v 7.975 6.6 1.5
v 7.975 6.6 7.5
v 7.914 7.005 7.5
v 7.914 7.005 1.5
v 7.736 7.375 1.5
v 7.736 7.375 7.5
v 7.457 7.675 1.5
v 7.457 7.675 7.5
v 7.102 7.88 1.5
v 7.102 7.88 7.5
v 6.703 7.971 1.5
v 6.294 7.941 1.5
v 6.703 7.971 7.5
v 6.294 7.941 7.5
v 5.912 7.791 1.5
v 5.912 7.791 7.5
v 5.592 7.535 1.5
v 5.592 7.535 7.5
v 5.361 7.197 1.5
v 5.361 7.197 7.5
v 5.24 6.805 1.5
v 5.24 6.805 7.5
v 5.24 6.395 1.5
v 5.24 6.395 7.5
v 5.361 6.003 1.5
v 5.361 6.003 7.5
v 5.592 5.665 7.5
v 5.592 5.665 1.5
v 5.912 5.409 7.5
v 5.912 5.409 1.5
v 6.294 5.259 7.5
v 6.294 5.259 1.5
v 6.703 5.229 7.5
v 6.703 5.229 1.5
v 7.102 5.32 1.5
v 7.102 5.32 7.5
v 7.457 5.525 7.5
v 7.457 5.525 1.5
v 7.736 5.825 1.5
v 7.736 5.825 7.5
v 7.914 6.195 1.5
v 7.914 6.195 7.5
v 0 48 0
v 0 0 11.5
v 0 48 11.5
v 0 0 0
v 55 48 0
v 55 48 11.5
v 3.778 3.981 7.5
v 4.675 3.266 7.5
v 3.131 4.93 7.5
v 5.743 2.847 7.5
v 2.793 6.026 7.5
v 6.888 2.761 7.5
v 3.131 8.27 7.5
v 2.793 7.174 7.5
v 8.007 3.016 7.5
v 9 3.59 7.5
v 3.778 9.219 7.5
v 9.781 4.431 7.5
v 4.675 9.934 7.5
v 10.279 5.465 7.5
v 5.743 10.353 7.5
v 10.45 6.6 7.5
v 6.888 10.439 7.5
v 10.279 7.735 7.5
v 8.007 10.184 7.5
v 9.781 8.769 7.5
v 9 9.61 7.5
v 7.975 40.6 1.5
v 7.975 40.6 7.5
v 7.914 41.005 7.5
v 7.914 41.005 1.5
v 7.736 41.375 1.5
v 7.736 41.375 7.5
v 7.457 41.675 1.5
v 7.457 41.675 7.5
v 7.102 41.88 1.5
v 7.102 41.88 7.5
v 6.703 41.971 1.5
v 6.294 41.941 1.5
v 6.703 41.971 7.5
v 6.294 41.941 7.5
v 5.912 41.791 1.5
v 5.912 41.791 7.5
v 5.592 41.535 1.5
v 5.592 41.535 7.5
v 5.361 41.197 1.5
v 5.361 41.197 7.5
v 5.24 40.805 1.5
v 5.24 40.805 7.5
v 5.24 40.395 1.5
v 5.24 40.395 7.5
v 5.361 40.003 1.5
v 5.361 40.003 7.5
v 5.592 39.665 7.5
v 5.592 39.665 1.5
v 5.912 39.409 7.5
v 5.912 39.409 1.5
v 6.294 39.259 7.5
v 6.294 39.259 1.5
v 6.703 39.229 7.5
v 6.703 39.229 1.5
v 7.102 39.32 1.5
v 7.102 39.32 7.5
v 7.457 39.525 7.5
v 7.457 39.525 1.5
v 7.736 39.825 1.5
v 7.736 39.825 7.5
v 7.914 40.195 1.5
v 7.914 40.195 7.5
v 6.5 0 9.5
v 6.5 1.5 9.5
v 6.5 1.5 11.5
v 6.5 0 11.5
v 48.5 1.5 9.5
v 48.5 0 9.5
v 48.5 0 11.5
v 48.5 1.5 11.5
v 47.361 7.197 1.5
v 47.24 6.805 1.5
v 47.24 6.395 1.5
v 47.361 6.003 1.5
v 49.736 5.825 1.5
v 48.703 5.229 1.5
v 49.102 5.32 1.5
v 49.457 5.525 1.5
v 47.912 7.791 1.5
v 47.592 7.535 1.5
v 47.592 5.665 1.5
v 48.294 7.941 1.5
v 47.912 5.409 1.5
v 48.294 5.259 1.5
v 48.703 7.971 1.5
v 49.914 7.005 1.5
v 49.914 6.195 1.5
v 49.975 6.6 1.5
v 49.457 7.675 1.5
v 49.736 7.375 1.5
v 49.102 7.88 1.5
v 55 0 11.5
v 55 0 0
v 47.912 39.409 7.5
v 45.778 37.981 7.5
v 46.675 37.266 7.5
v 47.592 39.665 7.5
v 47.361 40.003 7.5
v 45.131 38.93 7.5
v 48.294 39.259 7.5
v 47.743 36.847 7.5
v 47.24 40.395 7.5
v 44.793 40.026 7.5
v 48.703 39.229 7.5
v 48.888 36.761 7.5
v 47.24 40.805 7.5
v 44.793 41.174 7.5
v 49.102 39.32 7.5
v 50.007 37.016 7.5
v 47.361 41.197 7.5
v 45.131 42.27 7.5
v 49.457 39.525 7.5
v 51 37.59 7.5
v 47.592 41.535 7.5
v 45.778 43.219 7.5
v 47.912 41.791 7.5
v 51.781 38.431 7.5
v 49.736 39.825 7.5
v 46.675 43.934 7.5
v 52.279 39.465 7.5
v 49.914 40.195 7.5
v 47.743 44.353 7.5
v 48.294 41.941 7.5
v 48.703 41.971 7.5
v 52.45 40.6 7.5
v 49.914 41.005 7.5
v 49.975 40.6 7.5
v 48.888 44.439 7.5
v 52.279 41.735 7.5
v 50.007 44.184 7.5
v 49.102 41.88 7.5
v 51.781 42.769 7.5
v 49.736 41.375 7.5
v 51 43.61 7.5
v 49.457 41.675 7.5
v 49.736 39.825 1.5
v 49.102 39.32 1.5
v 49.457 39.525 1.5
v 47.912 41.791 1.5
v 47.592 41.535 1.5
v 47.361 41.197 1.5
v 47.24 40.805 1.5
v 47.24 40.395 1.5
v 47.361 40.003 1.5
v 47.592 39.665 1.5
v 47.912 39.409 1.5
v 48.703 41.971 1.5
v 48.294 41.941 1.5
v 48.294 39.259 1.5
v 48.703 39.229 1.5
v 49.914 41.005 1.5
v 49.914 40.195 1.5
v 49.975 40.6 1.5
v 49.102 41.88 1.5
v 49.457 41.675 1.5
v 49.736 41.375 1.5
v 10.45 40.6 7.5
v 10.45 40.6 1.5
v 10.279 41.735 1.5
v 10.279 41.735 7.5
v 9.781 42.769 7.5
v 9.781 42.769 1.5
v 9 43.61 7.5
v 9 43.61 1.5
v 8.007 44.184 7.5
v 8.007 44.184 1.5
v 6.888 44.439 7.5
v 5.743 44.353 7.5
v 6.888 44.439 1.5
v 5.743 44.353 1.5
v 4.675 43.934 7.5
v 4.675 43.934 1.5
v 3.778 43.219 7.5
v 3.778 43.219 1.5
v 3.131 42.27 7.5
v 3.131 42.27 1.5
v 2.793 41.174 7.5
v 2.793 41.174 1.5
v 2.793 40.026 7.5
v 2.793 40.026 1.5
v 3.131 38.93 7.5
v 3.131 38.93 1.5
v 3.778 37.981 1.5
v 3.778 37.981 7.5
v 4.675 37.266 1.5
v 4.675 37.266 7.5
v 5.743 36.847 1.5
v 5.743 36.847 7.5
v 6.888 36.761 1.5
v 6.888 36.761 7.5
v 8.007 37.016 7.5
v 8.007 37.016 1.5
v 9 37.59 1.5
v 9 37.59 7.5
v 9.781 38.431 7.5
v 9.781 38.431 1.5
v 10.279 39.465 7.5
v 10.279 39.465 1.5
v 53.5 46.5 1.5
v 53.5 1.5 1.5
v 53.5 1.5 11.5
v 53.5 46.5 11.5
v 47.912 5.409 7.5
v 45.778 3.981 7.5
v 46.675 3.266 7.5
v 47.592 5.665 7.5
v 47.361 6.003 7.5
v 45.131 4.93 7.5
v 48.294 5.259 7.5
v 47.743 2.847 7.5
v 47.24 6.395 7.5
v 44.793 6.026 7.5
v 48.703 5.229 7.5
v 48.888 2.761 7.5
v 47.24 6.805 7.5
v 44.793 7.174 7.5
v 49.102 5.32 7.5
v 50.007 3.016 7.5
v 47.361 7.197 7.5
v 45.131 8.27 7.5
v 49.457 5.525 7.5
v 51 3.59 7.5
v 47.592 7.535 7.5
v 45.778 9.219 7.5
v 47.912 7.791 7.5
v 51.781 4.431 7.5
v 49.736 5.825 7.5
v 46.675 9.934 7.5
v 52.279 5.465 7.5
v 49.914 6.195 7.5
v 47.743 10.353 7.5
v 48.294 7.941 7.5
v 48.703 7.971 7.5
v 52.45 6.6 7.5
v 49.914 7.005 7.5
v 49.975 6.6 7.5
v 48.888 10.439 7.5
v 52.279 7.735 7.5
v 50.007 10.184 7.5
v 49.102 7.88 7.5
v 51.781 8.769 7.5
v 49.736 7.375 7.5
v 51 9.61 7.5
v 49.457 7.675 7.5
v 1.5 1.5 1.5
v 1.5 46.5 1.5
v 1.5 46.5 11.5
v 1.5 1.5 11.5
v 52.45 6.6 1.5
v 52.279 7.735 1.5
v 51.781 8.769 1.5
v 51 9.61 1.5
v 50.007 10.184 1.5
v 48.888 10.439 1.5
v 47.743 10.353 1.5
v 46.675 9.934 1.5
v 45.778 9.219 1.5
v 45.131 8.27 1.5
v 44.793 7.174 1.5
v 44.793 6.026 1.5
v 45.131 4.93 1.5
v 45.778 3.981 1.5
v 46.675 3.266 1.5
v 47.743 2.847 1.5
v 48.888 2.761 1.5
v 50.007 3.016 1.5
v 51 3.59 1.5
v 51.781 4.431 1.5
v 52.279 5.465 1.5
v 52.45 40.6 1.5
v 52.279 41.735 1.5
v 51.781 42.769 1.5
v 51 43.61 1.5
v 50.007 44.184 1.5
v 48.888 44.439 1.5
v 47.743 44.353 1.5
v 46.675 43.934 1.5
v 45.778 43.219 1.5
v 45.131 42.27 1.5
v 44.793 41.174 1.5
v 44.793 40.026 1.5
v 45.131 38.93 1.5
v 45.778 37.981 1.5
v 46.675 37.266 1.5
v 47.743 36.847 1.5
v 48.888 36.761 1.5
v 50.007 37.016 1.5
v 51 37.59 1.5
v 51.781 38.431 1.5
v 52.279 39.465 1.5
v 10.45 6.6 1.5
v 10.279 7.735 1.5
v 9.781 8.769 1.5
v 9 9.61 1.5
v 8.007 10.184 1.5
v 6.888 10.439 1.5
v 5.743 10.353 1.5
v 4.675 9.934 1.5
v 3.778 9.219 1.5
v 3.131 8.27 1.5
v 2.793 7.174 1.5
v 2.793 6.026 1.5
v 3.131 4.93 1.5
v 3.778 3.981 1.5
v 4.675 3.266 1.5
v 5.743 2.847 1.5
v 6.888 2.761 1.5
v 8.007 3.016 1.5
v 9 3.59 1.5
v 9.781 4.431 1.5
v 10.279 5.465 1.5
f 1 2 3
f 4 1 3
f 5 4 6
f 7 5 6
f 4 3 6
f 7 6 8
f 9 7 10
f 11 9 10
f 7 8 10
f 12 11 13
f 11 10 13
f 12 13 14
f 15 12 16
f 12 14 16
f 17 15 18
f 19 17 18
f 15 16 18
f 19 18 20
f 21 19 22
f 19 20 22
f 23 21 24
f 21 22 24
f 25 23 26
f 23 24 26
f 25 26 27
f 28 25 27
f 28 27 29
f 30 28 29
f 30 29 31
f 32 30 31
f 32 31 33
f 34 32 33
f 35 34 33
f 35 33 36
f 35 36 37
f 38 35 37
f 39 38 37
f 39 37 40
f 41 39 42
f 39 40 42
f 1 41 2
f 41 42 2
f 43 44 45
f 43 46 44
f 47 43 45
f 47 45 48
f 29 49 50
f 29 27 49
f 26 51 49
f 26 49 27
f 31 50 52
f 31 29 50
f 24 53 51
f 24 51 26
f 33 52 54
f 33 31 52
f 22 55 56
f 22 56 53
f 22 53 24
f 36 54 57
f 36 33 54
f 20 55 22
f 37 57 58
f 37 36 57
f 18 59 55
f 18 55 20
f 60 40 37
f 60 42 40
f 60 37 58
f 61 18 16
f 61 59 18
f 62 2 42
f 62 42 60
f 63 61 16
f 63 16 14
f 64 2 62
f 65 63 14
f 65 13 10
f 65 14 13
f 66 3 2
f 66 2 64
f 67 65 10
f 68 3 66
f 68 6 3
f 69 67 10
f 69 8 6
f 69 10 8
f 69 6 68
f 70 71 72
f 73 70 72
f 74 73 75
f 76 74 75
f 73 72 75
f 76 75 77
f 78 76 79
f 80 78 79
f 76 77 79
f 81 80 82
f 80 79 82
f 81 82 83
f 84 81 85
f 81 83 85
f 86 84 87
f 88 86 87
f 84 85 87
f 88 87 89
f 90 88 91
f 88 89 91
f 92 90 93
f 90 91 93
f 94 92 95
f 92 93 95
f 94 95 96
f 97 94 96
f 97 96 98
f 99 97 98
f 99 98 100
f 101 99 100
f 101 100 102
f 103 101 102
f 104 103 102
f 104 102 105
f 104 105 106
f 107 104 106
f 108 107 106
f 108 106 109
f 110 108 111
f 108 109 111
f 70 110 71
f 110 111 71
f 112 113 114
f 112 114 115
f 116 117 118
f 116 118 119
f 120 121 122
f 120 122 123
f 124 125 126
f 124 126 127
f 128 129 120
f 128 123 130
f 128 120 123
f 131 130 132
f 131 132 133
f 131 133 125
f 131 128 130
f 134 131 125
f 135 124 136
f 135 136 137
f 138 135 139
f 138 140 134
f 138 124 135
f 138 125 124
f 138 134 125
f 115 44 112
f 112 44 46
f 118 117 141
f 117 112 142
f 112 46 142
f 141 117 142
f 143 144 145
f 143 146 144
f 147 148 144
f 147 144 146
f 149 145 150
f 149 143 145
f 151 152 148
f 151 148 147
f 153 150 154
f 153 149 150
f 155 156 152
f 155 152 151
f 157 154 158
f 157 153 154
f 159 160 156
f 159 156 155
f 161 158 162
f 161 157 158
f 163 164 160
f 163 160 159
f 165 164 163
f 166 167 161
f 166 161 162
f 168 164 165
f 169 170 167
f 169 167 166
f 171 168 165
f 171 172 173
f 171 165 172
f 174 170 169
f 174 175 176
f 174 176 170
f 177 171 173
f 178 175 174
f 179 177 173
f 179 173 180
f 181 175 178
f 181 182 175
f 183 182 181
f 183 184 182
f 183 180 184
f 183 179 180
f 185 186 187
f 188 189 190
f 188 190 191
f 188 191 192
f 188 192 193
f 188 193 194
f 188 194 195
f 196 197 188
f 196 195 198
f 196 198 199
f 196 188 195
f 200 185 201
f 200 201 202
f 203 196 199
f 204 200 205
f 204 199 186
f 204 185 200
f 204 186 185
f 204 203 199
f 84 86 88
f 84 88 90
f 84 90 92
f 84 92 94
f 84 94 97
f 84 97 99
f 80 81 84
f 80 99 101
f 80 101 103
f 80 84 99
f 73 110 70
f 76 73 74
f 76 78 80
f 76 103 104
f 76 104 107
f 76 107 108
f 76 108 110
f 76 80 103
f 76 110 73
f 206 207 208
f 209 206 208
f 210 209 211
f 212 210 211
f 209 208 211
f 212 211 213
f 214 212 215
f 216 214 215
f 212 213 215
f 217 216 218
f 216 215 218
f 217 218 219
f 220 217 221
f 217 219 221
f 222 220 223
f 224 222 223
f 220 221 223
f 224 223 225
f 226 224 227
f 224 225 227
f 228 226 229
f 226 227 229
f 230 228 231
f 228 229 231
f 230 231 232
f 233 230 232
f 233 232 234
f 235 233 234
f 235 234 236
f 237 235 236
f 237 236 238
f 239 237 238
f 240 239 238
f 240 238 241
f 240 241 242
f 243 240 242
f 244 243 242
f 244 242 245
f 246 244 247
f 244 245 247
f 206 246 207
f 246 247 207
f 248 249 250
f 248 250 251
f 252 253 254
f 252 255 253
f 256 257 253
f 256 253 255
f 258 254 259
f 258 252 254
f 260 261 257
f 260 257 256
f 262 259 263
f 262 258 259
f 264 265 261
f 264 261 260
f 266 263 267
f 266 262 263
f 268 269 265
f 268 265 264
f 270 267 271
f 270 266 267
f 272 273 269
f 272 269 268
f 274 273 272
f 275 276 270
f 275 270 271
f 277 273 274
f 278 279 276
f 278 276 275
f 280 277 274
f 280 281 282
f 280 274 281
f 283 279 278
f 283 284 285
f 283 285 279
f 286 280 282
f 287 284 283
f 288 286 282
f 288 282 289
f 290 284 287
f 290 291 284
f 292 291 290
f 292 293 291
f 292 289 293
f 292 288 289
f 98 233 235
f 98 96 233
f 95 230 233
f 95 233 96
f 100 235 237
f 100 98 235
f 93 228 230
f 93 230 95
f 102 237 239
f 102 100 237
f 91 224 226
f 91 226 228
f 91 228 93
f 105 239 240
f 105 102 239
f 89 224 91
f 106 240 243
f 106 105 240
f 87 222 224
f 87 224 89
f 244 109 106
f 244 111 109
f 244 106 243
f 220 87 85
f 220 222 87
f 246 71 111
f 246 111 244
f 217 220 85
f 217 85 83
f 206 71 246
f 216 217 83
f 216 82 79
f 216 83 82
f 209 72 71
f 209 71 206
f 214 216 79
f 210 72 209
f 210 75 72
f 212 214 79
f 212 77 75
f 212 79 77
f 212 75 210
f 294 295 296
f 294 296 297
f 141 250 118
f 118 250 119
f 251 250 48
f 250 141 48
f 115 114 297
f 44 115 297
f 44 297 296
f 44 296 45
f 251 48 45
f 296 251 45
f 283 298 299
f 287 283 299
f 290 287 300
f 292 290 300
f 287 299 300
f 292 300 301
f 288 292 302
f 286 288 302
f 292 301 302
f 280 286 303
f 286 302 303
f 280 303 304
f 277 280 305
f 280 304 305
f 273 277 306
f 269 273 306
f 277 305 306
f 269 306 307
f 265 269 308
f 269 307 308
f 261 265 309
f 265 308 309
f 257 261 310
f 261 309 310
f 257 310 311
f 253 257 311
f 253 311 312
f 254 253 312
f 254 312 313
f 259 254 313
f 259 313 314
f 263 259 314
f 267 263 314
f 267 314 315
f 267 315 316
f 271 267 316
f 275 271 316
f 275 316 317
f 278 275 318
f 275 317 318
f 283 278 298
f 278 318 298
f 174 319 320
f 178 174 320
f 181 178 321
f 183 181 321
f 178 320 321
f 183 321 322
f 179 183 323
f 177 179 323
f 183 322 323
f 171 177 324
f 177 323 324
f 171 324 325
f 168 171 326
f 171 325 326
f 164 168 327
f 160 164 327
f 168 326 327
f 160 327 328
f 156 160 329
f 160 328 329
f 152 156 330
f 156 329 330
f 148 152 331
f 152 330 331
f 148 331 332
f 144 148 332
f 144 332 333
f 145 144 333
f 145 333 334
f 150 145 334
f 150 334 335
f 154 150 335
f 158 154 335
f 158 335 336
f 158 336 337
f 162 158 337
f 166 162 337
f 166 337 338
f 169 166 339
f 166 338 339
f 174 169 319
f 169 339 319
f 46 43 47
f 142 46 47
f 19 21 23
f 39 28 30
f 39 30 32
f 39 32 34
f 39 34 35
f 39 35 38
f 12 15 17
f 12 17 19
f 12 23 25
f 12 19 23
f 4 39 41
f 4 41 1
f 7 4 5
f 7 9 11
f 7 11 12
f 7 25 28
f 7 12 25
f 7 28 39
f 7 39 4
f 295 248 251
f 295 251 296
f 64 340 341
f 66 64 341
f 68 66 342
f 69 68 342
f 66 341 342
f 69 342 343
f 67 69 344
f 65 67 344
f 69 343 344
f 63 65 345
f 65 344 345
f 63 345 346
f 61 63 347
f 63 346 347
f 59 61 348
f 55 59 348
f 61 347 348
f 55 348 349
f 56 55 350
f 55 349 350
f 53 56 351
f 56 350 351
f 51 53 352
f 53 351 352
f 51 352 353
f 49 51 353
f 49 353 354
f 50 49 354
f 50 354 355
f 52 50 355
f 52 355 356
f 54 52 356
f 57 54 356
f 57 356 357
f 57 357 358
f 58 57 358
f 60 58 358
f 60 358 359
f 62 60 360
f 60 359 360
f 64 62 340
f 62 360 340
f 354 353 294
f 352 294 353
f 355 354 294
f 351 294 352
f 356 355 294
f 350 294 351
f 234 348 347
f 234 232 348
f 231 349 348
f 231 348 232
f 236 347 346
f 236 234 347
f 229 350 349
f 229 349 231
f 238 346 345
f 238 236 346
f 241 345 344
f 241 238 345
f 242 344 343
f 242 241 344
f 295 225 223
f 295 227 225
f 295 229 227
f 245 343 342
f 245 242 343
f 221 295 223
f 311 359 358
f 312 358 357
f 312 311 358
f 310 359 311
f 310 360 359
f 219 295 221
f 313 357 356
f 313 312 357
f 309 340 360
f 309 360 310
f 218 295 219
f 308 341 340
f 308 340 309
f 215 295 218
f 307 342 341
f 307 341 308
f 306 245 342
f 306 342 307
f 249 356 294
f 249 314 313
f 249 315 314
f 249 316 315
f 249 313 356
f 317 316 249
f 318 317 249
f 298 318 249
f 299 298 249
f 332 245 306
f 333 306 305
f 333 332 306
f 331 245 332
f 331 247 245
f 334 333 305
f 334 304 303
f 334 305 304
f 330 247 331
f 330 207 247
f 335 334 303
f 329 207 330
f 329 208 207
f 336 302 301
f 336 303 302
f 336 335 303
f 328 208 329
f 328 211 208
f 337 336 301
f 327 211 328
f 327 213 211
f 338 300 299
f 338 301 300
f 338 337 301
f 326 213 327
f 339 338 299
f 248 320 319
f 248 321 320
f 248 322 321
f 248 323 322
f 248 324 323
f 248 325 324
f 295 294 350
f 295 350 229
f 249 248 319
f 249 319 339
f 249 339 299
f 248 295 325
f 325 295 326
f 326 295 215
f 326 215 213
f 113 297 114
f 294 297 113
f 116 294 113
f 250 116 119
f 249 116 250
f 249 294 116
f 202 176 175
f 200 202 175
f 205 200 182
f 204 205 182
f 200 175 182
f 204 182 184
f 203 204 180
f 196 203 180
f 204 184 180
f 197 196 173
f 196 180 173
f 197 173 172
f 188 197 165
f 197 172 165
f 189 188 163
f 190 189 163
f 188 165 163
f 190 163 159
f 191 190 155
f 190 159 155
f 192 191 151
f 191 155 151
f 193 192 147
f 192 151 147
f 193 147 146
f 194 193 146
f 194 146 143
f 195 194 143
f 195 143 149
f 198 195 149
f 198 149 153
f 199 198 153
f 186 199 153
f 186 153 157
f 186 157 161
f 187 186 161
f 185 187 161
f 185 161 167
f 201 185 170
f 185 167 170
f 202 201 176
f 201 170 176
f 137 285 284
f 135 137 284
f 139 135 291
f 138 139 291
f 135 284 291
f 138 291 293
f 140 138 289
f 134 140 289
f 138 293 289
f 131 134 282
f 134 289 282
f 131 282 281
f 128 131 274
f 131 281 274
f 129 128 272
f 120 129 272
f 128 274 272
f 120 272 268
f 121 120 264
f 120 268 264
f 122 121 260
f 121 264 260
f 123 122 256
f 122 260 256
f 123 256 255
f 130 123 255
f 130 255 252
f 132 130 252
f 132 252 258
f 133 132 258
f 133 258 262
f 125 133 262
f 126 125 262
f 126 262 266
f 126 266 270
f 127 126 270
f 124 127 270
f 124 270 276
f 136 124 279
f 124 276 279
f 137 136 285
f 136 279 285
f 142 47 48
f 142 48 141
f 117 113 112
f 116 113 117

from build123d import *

# Parameters (mm, degrees)
SKETCH_W     = 55
SKETCH_H     = 48
PAD_DEPTH    = 1.5
SKETCH001_R  = 3.85
PAD001_DEPTH = 6
SKETCH002_R  = 1.375
POCKET_DEPTH = 6
PAD002_DEPTH = 10
SKETCH004_W  = 42
SKETCH004_H  = 1.5
PAD003_DEPTH = 8


with BuildPart() as part:
    # Sketch → Pad (new body)
    with BuildSketch(Plane.XY):
        with Locations((27.5, 24)):
            Rectangle(SKETCH_W, SKETCH_H)
    extrude(amount=PAD_DEPTH)

    # Sketch001 (on Face6 of Pad) → Pad001 (join)
    with BuildSketch(Plane.XY.offset(1.5)):
        with Locations((6.6, 6.6)):
            Circle(SKETCH001_R)
        with Locations((6.6, 40.6)):
            Circle(SKETCH001_R)
        with Locations((48.6, 40.6)):
            Circle(SKETCH001_R)
        with Locations((48.6, 6.6)):
            Circle(SKETCH001_R)
    extrude(amount=PAD001_DEPTH)

    # Sketch002 (on Face11 of Pad001) → Pocket (cut)
    with BuildSketch(Plane.XY.offset(7.5)):
        with Locations((6.6, 6.6)):
            Circle(SKETCH002_R)
        with Locations((6.6, 40.6)):
            Circle(SKETCH002_R)
        with Locations((48.6, 40.6)):
            Circle(SKETCH002_R)
        with Locations((48.6, 6.6)):
            Circle(SKETCH002_R)
    extrude(amount=-POCKET_DEPTH, mode=Mode.SUBTRACT)

    # Sketch003 (on Face5 of Pocket) → Pad002 (join)
    with BuildSketch(Plane.XY.offset(1.5)):
        Polygon((0, 0), (0, 48), (55, 48), (55, 0), (48.5, 0), (48.5, 1.5), (53.5, 1.5), (53.5, 46.5), (1.5, 46.5), (1.5, 1.5), (6.5, 1.5), (6.5, 0), align=None)
    extrude(amount=PAD002_DEPTH)

    # Sketch004 (on Face8 of Pad002) → Pad003 (join)
    with BuildSketch(Plane.XY.offset(1.5)):
        with Locations((27.5, 0.75)):
            Rectangle(SKETCH004_W, SKETCH004_H)
    extrude(amount=PAD003_DEPTH)


solid = part.part
